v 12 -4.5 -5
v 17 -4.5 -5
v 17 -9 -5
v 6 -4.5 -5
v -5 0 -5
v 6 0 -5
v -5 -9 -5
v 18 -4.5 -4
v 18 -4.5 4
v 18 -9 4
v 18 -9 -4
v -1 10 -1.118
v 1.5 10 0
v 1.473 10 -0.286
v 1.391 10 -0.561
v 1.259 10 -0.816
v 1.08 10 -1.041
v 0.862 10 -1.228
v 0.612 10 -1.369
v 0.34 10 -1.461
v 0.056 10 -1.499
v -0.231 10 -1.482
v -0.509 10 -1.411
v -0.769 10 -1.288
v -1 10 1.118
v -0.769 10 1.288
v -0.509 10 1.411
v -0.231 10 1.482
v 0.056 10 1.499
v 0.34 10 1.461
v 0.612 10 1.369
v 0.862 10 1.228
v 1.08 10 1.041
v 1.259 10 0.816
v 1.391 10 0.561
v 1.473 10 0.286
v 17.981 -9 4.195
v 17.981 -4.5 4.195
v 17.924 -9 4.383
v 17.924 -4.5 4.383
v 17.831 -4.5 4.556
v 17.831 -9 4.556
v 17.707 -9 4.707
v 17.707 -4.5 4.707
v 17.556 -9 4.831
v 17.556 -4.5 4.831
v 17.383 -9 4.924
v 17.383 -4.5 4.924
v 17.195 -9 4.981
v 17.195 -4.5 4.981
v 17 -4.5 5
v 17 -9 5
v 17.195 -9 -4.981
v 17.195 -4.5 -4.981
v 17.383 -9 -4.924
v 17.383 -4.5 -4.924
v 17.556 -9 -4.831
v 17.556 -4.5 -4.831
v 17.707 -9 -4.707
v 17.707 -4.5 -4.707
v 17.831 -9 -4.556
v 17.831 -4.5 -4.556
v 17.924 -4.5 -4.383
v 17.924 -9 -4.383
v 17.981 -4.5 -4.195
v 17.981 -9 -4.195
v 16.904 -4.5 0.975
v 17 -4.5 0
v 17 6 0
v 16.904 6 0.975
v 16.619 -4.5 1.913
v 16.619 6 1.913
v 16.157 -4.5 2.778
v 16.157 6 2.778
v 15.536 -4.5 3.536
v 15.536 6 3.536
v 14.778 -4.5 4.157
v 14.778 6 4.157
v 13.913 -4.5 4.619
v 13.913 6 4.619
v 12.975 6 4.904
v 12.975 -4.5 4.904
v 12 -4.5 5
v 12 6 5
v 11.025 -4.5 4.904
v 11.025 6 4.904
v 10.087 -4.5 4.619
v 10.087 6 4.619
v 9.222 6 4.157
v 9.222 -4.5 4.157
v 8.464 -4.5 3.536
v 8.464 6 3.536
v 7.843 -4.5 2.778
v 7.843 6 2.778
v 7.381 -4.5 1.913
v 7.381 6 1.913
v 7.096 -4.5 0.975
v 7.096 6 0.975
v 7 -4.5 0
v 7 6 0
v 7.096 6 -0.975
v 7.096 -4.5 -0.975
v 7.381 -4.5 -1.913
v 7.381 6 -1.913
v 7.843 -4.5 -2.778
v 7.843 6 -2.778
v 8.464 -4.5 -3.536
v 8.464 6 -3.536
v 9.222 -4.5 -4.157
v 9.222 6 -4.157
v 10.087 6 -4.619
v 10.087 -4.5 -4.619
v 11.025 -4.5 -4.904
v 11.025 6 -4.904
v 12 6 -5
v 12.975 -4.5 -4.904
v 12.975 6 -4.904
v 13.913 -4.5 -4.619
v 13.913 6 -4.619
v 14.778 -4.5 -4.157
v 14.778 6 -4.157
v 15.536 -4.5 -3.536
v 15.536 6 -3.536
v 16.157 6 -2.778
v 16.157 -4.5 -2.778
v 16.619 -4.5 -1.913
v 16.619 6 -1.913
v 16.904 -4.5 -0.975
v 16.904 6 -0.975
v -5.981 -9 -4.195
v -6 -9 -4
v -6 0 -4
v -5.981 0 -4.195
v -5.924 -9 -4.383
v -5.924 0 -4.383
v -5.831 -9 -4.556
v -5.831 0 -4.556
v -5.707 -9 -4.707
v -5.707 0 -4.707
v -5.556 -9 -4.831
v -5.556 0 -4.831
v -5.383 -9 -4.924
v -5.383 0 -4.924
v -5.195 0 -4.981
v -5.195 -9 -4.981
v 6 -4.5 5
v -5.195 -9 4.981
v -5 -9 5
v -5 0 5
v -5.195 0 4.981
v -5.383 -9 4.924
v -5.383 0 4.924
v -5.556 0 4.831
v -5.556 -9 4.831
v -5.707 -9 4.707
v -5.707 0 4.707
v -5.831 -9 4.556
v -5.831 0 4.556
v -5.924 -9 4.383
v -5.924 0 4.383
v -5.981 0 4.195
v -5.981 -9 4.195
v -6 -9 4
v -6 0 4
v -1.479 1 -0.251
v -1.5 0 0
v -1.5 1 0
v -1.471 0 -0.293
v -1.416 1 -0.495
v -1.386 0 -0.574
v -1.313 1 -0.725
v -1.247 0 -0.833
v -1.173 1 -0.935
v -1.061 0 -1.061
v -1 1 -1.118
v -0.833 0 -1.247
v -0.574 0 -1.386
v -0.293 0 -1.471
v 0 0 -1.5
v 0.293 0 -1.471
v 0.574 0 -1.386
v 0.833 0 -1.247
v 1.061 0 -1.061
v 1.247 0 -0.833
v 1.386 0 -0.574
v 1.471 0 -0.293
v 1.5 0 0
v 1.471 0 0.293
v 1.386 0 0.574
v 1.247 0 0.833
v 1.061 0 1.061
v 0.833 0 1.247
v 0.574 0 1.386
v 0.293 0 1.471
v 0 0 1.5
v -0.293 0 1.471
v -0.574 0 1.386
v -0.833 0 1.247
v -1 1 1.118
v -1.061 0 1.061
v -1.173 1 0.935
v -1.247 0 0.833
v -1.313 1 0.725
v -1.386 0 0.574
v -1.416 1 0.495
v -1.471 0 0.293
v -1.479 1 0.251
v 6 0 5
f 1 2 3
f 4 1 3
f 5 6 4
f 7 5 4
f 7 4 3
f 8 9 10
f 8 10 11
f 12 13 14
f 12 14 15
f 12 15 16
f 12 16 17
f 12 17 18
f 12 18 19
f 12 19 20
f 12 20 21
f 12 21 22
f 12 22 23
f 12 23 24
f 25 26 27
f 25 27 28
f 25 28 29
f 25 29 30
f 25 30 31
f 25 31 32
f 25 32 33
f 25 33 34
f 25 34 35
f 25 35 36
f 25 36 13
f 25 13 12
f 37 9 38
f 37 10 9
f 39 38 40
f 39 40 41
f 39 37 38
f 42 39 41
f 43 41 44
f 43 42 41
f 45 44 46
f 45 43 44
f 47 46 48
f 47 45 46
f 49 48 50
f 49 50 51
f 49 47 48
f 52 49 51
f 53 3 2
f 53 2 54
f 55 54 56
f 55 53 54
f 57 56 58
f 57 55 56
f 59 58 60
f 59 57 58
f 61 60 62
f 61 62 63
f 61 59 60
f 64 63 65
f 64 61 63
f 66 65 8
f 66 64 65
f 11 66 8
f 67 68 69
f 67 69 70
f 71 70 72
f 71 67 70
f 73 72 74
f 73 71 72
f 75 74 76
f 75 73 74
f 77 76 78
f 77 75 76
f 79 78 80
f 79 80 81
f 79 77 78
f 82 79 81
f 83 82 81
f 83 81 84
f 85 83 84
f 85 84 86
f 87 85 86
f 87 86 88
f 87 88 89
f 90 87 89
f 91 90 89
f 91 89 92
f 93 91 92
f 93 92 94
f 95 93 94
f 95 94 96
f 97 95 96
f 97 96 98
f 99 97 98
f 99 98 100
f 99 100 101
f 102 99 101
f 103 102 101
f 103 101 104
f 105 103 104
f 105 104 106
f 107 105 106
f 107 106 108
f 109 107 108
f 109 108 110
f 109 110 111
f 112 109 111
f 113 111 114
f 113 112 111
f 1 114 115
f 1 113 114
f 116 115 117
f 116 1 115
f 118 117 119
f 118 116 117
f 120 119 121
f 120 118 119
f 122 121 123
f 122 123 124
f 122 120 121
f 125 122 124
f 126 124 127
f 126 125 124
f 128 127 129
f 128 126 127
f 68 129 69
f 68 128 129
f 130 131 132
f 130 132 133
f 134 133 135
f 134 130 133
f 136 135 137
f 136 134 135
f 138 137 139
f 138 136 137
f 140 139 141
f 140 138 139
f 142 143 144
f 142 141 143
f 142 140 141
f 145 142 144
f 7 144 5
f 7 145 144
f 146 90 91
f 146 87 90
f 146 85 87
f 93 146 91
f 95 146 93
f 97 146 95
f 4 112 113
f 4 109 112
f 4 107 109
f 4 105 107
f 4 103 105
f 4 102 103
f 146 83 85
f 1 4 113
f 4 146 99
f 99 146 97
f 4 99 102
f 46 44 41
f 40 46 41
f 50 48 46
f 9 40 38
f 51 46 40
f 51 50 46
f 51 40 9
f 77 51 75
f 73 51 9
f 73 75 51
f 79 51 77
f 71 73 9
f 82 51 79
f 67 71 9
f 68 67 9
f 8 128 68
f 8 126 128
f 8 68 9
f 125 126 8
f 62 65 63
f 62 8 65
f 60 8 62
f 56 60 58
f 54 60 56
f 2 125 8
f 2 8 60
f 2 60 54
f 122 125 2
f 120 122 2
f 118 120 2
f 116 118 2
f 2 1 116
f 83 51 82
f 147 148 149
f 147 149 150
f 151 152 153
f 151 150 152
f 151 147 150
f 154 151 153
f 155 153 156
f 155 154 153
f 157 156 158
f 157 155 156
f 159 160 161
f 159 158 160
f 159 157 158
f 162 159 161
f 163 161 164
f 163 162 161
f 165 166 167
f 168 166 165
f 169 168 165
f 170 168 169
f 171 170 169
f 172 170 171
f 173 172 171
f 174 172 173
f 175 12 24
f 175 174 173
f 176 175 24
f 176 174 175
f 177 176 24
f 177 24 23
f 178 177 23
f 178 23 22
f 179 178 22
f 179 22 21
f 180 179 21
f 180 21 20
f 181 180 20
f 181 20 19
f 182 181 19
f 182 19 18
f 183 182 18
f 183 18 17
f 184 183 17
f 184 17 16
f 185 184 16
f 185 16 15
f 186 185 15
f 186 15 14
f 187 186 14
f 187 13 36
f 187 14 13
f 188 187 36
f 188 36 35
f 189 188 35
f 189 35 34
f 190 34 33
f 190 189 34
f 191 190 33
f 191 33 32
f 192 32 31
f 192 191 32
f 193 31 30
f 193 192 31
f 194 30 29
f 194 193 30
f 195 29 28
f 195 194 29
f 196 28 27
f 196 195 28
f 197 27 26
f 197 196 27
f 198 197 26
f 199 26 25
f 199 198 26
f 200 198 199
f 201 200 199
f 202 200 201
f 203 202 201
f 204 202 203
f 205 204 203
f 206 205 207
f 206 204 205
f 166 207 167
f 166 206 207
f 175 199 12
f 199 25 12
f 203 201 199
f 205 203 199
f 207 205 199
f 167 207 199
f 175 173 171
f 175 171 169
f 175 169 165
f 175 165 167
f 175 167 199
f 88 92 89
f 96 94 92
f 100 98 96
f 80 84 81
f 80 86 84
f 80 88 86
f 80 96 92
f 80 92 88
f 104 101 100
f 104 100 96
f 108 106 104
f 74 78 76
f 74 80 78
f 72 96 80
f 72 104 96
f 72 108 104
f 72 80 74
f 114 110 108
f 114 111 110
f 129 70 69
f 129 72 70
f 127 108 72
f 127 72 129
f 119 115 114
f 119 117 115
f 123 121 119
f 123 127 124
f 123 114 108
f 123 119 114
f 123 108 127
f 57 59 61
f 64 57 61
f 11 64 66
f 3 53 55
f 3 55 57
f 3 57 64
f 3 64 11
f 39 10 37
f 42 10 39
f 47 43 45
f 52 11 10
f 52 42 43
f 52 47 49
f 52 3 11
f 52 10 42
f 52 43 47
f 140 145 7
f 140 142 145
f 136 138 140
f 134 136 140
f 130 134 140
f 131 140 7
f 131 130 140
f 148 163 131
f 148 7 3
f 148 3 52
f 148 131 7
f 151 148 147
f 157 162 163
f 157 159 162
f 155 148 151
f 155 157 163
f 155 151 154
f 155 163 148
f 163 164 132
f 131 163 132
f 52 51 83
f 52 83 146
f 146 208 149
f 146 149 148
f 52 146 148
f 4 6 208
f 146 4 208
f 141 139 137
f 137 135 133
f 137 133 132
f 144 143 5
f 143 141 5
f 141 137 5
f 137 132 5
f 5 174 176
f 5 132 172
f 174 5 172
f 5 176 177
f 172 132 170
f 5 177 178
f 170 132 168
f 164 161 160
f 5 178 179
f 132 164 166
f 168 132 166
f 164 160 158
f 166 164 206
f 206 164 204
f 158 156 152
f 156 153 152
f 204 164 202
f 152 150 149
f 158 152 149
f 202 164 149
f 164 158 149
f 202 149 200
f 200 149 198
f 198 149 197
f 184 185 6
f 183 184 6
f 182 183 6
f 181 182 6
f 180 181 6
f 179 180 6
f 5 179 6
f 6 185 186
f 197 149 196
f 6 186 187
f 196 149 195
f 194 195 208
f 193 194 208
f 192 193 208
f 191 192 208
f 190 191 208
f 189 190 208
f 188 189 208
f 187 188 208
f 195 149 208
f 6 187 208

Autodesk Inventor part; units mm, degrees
ref_plane "YZ Plane" through (0, 0, 0) normal (1, 0, 0) x (0, 1, 0)
ref_plane "XZ Plane" through (0, 0, 0) normal (0, 1, 0) x (-1, 0, 0)
ref_plane "XY Plane" through (0, 0, 0) normal (0, 0, 1) x (1, 0, 0)
sketch "Sketch1" plane through (0, 0, 0) normal (0, 1, 0) x (-1, 0, 0)
  circle A0 centre (0, 0) radius 1.5
  dimension "d0" = 3
extrude "Extrusion1" add sketch "Sketch1" along normal blind 10
sketch "Sketch2" plane through (0, 0, 0) normal (0, -1, 0) x (1, 0, 0)
  line L0 (6, 5) -> (-6, 5)
  line L1 (-6, 5) -> (-6, -5)
  line L2 (-6, -5) -> (6, -5)
  line L3 (6, -5) -> (6, 5)
  line L4 (6, 5) -> (-6, -5) construction
  line L5 (-6, 5) -> (6, -5) construction
  point P0 (0, 0)
  point P1 (0, 0)
  point P2 (0, 0)
  point P3 (0, 0)
  dimension "d3" = 10
  dimension "d4" = 12
extrude "Extrusion2" add sketch "Sketch2" along normal blind 9
sketch "Sketch3" plane through (6, 0, 5) normal (1, 0, 0) x (0, 0, -1)
  line L0 (10, 0) -> (0, 0) projected
  line L1 (0, 0) -> (0, -9) projected
  line L2 (10, -9) -> (0, -9) projected
  line L3 (10, 0) -> (10, -9) projected
  line L4 (0, 0) -> (0, -9) projected
  line L5 (0, -4.5) -> (10, -4.5)
  line L6 (10, 0) -> (10, -9) projected
  point P0 (5, 0)
  point P1 (0, -4.5)
extrude "Extrusion3" add sketch "Sketch3" along normal blind 12 contours L3 L2 L1 L5
sketch "Sketch4" plane through (6, -4.5, 5) normal (0, 1, 0) x (1, 0, 0)
  line L0 (0, 0) -> (0, 10) projected
  line L1 (0, 0) -> (12, 0) projected
  line L2 (12, 10) -> (12, 0) projected
  line L3 (0, 10) -> (12, 10) projected
  circle A0 centre (6, 5) radius 5
  point P0 (-6, 5)
  point P1 (12, 5)
  point P2 (6, 0)
  dimension "d9" = 10
extrude "Extrusion4" add sketch "Sketch4" along normal blind 10.5 contours A0
fillet "Fillet1" radius 1 4 edges at (-6, -4.5, 5) (18, -6.75, 5) (18, -6.75, -5) (-6, -4.5, -5)
sketch "Sketch5" plane through (0, 10, 0) normal (0, 1, 0) x (1, 0, 0)
  circle A0 centre (0, 0) radius 1.5 projected
  line L0 (-1, -1.118) -> (-1, 1.118)
  circle A1 centre (0, 0) radius 1.5 projected
  dimension "d13" = 0.5
extrude "Extrusion5" cut sketch "Sketch5" against normal blind 9 contours L0 A0 picked at (-1.1631, -0.0599)
properties part number "GM1024BY10" material "Bronze, Soft Tin"
